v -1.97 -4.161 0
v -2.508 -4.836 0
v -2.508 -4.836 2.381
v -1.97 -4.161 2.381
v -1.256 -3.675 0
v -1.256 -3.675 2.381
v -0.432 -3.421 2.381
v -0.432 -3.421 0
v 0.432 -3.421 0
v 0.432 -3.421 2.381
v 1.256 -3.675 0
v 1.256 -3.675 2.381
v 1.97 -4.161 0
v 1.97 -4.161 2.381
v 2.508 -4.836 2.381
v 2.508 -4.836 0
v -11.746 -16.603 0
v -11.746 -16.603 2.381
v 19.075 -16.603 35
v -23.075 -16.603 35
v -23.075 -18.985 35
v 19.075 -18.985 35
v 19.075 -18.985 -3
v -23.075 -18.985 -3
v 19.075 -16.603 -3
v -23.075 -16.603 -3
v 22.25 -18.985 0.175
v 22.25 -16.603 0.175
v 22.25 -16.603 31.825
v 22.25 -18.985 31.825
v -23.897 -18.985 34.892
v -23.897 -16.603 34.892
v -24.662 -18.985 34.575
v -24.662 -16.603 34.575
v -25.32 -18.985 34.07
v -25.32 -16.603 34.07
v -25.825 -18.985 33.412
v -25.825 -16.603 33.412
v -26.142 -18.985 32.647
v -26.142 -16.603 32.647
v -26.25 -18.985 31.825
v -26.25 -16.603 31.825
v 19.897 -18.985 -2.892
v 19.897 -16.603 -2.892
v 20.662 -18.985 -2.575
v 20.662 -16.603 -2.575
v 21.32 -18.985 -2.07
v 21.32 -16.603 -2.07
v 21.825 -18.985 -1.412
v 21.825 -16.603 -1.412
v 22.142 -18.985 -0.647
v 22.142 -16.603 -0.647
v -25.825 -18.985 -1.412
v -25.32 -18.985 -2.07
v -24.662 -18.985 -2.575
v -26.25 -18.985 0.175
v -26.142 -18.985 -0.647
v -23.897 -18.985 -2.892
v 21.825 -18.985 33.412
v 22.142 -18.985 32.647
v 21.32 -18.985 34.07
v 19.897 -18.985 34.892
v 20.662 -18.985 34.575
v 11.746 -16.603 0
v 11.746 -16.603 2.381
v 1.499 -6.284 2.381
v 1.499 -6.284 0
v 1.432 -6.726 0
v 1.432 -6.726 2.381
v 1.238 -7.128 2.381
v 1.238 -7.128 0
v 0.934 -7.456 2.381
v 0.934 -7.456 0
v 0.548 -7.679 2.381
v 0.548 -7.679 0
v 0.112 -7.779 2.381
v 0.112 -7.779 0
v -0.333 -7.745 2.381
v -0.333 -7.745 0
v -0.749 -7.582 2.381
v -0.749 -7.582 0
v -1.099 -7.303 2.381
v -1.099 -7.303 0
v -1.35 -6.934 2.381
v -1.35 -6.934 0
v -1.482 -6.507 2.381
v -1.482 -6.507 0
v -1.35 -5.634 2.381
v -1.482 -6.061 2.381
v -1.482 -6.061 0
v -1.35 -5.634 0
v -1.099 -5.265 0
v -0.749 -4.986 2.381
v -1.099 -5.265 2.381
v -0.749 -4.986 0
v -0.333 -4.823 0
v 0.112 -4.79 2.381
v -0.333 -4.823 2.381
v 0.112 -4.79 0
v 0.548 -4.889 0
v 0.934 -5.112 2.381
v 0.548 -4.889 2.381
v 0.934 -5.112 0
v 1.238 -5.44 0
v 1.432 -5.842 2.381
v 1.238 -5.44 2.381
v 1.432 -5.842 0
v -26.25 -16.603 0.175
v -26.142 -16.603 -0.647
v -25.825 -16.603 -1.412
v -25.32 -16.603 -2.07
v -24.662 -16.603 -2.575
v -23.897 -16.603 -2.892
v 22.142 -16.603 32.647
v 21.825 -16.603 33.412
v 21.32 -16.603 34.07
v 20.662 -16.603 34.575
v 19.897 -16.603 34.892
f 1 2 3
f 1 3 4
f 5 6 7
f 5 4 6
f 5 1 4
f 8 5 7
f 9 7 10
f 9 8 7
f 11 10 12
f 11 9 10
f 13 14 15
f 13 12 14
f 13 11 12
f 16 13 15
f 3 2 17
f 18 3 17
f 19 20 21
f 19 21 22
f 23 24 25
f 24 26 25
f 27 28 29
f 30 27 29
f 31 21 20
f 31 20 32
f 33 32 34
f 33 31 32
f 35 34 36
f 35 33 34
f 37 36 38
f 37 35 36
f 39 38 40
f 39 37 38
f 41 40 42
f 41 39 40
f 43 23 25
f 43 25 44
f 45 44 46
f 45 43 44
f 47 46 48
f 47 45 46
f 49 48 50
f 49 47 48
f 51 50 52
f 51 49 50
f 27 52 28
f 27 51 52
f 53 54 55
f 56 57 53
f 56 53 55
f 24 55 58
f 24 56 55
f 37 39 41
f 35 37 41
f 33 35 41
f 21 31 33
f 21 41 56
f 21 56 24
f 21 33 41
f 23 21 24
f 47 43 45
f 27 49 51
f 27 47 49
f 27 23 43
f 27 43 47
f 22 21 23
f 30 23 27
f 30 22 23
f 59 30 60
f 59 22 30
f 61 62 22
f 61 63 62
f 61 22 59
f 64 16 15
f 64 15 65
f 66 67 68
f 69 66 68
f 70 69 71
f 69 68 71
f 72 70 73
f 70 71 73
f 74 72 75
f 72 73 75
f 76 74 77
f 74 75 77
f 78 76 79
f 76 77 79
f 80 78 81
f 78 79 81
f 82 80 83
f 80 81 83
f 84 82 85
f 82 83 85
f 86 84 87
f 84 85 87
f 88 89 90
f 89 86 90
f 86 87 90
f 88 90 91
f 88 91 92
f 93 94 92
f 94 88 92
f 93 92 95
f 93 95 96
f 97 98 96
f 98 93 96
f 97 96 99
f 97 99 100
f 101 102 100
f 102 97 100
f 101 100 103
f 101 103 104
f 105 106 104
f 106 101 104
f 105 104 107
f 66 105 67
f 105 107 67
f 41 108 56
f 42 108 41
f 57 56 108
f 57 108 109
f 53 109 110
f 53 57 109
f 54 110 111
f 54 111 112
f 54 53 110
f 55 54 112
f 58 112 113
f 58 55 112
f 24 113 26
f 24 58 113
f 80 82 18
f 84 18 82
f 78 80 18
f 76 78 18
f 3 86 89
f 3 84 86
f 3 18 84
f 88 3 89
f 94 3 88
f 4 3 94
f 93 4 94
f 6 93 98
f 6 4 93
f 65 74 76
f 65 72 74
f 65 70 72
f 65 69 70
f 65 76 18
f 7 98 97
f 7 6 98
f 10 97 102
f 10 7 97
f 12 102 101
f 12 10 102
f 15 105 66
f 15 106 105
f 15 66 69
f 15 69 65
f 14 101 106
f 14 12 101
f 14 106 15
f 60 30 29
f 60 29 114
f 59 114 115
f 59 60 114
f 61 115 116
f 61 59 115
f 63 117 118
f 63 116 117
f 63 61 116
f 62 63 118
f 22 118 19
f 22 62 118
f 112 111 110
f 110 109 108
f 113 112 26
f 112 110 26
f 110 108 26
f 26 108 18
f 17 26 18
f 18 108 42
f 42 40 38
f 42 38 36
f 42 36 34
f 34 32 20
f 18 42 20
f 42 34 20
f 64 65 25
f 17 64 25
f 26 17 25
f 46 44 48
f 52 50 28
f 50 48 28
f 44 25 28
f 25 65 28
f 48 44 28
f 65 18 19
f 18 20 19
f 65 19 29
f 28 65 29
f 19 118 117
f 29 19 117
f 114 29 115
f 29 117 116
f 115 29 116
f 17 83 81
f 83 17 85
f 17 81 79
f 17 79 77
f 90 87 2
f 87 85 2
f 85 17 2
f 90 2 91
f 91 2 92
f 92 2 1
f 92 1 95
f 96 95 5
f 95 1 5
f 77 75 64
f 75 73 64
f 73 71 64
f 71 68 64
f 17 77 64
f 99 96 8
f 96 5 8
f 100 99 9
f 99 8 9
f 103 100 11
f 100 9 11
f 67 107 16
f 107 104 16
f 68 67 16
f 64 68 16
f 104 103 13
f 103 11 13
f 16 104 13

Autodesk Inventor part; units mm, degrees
ref_plane "YZ Plane" through (0, 0, 0) normal (1, 0, 0) x (0, 1, 0)
ref_plane "XZ Plane" through (0, 0, 0) normal (0, 1, 0) x (-1, 0, 0)
ref_plane "XY Plane" through (0, 0, 0) normal (0, 0, 1) x (1, 0, 0)
ref_plane "Work Plane1" through (0, 0, 0) normal (0, 0, 1) x (1, 0, 0)
sketch "Sketch1" plane through (0, 0, 0) normal (0, 0, 1) x (1, 0, 0)
  circle A0 centre (0, -6.2841) radius 1.4986 projected
  arc A1 (-2.5077, -7.7319) -> (2.5077, -7.7319) centre (0, -6.2841) ccw projected
  line L0 (-2.5077, -7.7319) -> (-11.746, 4.0347) projected
  line L1 (11.746, 4.0347) -> (-11.746, 4.0347) projected
  line L2 (11.746, 4.0347) -> (2.5077, -7.7319) projected
  circle A2 centre (0, -6.2841) radius 1.4986
  line L3 (-11.746, 4.0347) -> (-3.6444, -6.2841)
  line L4 (3.6444, -6.2841) -> (11.746, 4.0347)
  line L5 (11.746, 4.0347) -> (-11.746, 4.0347)
  line L6 (2.5077, -4.8363) -> (11.7464, -16.6034)
  line L7 (-2.5077, -4.8363) -> (-11.7464, -16.6034)
  line L8 (-11.7464, -16.6034) -> (11.7464, -16.6034)
  arc A3 (2.5077, -4.8363) -> (-2.5077, -4.8363) centre (0, -6.2841) ccw
  point P0 (0, 0)
  dimension "d0" = 14.9606
  dimension "d1" = 14.9606
extrude "Extrusion1" add sketch "Sketch1" along normal blind 2.3813 contours L0 L7 A3 L6 L2 A1 | A1 L2 L6 L8 L7 L0
sketch "Sketch2" plane through (-11.7464, -16.6034, 0) normal (0, -1, 0) x (1, 0, 0)
  line L0 (5.9964, 35) -> (26.2464, 35) projected
  line L1 (20.4964, -2.75) -> (29.2464, -2.75) projected
  line L2 (-7.5036, -3) -> (1.4964, -3) projected
  line L3 (-14.5036, 16.05) -> (-14.5036, 26.8) projected
  line L4 (33.9964, 15.95) -> (33.9964, 5) projected
  line L5 (-14.5036, 26.8) -> (-14.5036, -3)
  line L6 (-14.5036, -3) -> (33.9964, -3)
  line L7 (33.9964, -3) -> (33.9964, 35)
  line L8 (33.9964, 35) -> (-14.5036, 35)
  line L9 (-14.5036, -3) -> (-14.5036, 35)
  point P0 (11.7464, 0)
extrude "Extrusion2" add sketch "Sketch2" along normal blind 2.3813
fillet "Fillet1" radius 3.175 1 edges at (-26.25, -17.794, -3)
fillet "Fillet2" radius 3.175 1 edges at (-26.25, -17.794, 35)
fillet "Fillet3" radius 3.175 1 edges at (22.25, -17.794, 35)
fillet "Fillet4" radius 3.175 1 edges at (22.25, -17.794, -3)
properties part number "headtilt-base"
